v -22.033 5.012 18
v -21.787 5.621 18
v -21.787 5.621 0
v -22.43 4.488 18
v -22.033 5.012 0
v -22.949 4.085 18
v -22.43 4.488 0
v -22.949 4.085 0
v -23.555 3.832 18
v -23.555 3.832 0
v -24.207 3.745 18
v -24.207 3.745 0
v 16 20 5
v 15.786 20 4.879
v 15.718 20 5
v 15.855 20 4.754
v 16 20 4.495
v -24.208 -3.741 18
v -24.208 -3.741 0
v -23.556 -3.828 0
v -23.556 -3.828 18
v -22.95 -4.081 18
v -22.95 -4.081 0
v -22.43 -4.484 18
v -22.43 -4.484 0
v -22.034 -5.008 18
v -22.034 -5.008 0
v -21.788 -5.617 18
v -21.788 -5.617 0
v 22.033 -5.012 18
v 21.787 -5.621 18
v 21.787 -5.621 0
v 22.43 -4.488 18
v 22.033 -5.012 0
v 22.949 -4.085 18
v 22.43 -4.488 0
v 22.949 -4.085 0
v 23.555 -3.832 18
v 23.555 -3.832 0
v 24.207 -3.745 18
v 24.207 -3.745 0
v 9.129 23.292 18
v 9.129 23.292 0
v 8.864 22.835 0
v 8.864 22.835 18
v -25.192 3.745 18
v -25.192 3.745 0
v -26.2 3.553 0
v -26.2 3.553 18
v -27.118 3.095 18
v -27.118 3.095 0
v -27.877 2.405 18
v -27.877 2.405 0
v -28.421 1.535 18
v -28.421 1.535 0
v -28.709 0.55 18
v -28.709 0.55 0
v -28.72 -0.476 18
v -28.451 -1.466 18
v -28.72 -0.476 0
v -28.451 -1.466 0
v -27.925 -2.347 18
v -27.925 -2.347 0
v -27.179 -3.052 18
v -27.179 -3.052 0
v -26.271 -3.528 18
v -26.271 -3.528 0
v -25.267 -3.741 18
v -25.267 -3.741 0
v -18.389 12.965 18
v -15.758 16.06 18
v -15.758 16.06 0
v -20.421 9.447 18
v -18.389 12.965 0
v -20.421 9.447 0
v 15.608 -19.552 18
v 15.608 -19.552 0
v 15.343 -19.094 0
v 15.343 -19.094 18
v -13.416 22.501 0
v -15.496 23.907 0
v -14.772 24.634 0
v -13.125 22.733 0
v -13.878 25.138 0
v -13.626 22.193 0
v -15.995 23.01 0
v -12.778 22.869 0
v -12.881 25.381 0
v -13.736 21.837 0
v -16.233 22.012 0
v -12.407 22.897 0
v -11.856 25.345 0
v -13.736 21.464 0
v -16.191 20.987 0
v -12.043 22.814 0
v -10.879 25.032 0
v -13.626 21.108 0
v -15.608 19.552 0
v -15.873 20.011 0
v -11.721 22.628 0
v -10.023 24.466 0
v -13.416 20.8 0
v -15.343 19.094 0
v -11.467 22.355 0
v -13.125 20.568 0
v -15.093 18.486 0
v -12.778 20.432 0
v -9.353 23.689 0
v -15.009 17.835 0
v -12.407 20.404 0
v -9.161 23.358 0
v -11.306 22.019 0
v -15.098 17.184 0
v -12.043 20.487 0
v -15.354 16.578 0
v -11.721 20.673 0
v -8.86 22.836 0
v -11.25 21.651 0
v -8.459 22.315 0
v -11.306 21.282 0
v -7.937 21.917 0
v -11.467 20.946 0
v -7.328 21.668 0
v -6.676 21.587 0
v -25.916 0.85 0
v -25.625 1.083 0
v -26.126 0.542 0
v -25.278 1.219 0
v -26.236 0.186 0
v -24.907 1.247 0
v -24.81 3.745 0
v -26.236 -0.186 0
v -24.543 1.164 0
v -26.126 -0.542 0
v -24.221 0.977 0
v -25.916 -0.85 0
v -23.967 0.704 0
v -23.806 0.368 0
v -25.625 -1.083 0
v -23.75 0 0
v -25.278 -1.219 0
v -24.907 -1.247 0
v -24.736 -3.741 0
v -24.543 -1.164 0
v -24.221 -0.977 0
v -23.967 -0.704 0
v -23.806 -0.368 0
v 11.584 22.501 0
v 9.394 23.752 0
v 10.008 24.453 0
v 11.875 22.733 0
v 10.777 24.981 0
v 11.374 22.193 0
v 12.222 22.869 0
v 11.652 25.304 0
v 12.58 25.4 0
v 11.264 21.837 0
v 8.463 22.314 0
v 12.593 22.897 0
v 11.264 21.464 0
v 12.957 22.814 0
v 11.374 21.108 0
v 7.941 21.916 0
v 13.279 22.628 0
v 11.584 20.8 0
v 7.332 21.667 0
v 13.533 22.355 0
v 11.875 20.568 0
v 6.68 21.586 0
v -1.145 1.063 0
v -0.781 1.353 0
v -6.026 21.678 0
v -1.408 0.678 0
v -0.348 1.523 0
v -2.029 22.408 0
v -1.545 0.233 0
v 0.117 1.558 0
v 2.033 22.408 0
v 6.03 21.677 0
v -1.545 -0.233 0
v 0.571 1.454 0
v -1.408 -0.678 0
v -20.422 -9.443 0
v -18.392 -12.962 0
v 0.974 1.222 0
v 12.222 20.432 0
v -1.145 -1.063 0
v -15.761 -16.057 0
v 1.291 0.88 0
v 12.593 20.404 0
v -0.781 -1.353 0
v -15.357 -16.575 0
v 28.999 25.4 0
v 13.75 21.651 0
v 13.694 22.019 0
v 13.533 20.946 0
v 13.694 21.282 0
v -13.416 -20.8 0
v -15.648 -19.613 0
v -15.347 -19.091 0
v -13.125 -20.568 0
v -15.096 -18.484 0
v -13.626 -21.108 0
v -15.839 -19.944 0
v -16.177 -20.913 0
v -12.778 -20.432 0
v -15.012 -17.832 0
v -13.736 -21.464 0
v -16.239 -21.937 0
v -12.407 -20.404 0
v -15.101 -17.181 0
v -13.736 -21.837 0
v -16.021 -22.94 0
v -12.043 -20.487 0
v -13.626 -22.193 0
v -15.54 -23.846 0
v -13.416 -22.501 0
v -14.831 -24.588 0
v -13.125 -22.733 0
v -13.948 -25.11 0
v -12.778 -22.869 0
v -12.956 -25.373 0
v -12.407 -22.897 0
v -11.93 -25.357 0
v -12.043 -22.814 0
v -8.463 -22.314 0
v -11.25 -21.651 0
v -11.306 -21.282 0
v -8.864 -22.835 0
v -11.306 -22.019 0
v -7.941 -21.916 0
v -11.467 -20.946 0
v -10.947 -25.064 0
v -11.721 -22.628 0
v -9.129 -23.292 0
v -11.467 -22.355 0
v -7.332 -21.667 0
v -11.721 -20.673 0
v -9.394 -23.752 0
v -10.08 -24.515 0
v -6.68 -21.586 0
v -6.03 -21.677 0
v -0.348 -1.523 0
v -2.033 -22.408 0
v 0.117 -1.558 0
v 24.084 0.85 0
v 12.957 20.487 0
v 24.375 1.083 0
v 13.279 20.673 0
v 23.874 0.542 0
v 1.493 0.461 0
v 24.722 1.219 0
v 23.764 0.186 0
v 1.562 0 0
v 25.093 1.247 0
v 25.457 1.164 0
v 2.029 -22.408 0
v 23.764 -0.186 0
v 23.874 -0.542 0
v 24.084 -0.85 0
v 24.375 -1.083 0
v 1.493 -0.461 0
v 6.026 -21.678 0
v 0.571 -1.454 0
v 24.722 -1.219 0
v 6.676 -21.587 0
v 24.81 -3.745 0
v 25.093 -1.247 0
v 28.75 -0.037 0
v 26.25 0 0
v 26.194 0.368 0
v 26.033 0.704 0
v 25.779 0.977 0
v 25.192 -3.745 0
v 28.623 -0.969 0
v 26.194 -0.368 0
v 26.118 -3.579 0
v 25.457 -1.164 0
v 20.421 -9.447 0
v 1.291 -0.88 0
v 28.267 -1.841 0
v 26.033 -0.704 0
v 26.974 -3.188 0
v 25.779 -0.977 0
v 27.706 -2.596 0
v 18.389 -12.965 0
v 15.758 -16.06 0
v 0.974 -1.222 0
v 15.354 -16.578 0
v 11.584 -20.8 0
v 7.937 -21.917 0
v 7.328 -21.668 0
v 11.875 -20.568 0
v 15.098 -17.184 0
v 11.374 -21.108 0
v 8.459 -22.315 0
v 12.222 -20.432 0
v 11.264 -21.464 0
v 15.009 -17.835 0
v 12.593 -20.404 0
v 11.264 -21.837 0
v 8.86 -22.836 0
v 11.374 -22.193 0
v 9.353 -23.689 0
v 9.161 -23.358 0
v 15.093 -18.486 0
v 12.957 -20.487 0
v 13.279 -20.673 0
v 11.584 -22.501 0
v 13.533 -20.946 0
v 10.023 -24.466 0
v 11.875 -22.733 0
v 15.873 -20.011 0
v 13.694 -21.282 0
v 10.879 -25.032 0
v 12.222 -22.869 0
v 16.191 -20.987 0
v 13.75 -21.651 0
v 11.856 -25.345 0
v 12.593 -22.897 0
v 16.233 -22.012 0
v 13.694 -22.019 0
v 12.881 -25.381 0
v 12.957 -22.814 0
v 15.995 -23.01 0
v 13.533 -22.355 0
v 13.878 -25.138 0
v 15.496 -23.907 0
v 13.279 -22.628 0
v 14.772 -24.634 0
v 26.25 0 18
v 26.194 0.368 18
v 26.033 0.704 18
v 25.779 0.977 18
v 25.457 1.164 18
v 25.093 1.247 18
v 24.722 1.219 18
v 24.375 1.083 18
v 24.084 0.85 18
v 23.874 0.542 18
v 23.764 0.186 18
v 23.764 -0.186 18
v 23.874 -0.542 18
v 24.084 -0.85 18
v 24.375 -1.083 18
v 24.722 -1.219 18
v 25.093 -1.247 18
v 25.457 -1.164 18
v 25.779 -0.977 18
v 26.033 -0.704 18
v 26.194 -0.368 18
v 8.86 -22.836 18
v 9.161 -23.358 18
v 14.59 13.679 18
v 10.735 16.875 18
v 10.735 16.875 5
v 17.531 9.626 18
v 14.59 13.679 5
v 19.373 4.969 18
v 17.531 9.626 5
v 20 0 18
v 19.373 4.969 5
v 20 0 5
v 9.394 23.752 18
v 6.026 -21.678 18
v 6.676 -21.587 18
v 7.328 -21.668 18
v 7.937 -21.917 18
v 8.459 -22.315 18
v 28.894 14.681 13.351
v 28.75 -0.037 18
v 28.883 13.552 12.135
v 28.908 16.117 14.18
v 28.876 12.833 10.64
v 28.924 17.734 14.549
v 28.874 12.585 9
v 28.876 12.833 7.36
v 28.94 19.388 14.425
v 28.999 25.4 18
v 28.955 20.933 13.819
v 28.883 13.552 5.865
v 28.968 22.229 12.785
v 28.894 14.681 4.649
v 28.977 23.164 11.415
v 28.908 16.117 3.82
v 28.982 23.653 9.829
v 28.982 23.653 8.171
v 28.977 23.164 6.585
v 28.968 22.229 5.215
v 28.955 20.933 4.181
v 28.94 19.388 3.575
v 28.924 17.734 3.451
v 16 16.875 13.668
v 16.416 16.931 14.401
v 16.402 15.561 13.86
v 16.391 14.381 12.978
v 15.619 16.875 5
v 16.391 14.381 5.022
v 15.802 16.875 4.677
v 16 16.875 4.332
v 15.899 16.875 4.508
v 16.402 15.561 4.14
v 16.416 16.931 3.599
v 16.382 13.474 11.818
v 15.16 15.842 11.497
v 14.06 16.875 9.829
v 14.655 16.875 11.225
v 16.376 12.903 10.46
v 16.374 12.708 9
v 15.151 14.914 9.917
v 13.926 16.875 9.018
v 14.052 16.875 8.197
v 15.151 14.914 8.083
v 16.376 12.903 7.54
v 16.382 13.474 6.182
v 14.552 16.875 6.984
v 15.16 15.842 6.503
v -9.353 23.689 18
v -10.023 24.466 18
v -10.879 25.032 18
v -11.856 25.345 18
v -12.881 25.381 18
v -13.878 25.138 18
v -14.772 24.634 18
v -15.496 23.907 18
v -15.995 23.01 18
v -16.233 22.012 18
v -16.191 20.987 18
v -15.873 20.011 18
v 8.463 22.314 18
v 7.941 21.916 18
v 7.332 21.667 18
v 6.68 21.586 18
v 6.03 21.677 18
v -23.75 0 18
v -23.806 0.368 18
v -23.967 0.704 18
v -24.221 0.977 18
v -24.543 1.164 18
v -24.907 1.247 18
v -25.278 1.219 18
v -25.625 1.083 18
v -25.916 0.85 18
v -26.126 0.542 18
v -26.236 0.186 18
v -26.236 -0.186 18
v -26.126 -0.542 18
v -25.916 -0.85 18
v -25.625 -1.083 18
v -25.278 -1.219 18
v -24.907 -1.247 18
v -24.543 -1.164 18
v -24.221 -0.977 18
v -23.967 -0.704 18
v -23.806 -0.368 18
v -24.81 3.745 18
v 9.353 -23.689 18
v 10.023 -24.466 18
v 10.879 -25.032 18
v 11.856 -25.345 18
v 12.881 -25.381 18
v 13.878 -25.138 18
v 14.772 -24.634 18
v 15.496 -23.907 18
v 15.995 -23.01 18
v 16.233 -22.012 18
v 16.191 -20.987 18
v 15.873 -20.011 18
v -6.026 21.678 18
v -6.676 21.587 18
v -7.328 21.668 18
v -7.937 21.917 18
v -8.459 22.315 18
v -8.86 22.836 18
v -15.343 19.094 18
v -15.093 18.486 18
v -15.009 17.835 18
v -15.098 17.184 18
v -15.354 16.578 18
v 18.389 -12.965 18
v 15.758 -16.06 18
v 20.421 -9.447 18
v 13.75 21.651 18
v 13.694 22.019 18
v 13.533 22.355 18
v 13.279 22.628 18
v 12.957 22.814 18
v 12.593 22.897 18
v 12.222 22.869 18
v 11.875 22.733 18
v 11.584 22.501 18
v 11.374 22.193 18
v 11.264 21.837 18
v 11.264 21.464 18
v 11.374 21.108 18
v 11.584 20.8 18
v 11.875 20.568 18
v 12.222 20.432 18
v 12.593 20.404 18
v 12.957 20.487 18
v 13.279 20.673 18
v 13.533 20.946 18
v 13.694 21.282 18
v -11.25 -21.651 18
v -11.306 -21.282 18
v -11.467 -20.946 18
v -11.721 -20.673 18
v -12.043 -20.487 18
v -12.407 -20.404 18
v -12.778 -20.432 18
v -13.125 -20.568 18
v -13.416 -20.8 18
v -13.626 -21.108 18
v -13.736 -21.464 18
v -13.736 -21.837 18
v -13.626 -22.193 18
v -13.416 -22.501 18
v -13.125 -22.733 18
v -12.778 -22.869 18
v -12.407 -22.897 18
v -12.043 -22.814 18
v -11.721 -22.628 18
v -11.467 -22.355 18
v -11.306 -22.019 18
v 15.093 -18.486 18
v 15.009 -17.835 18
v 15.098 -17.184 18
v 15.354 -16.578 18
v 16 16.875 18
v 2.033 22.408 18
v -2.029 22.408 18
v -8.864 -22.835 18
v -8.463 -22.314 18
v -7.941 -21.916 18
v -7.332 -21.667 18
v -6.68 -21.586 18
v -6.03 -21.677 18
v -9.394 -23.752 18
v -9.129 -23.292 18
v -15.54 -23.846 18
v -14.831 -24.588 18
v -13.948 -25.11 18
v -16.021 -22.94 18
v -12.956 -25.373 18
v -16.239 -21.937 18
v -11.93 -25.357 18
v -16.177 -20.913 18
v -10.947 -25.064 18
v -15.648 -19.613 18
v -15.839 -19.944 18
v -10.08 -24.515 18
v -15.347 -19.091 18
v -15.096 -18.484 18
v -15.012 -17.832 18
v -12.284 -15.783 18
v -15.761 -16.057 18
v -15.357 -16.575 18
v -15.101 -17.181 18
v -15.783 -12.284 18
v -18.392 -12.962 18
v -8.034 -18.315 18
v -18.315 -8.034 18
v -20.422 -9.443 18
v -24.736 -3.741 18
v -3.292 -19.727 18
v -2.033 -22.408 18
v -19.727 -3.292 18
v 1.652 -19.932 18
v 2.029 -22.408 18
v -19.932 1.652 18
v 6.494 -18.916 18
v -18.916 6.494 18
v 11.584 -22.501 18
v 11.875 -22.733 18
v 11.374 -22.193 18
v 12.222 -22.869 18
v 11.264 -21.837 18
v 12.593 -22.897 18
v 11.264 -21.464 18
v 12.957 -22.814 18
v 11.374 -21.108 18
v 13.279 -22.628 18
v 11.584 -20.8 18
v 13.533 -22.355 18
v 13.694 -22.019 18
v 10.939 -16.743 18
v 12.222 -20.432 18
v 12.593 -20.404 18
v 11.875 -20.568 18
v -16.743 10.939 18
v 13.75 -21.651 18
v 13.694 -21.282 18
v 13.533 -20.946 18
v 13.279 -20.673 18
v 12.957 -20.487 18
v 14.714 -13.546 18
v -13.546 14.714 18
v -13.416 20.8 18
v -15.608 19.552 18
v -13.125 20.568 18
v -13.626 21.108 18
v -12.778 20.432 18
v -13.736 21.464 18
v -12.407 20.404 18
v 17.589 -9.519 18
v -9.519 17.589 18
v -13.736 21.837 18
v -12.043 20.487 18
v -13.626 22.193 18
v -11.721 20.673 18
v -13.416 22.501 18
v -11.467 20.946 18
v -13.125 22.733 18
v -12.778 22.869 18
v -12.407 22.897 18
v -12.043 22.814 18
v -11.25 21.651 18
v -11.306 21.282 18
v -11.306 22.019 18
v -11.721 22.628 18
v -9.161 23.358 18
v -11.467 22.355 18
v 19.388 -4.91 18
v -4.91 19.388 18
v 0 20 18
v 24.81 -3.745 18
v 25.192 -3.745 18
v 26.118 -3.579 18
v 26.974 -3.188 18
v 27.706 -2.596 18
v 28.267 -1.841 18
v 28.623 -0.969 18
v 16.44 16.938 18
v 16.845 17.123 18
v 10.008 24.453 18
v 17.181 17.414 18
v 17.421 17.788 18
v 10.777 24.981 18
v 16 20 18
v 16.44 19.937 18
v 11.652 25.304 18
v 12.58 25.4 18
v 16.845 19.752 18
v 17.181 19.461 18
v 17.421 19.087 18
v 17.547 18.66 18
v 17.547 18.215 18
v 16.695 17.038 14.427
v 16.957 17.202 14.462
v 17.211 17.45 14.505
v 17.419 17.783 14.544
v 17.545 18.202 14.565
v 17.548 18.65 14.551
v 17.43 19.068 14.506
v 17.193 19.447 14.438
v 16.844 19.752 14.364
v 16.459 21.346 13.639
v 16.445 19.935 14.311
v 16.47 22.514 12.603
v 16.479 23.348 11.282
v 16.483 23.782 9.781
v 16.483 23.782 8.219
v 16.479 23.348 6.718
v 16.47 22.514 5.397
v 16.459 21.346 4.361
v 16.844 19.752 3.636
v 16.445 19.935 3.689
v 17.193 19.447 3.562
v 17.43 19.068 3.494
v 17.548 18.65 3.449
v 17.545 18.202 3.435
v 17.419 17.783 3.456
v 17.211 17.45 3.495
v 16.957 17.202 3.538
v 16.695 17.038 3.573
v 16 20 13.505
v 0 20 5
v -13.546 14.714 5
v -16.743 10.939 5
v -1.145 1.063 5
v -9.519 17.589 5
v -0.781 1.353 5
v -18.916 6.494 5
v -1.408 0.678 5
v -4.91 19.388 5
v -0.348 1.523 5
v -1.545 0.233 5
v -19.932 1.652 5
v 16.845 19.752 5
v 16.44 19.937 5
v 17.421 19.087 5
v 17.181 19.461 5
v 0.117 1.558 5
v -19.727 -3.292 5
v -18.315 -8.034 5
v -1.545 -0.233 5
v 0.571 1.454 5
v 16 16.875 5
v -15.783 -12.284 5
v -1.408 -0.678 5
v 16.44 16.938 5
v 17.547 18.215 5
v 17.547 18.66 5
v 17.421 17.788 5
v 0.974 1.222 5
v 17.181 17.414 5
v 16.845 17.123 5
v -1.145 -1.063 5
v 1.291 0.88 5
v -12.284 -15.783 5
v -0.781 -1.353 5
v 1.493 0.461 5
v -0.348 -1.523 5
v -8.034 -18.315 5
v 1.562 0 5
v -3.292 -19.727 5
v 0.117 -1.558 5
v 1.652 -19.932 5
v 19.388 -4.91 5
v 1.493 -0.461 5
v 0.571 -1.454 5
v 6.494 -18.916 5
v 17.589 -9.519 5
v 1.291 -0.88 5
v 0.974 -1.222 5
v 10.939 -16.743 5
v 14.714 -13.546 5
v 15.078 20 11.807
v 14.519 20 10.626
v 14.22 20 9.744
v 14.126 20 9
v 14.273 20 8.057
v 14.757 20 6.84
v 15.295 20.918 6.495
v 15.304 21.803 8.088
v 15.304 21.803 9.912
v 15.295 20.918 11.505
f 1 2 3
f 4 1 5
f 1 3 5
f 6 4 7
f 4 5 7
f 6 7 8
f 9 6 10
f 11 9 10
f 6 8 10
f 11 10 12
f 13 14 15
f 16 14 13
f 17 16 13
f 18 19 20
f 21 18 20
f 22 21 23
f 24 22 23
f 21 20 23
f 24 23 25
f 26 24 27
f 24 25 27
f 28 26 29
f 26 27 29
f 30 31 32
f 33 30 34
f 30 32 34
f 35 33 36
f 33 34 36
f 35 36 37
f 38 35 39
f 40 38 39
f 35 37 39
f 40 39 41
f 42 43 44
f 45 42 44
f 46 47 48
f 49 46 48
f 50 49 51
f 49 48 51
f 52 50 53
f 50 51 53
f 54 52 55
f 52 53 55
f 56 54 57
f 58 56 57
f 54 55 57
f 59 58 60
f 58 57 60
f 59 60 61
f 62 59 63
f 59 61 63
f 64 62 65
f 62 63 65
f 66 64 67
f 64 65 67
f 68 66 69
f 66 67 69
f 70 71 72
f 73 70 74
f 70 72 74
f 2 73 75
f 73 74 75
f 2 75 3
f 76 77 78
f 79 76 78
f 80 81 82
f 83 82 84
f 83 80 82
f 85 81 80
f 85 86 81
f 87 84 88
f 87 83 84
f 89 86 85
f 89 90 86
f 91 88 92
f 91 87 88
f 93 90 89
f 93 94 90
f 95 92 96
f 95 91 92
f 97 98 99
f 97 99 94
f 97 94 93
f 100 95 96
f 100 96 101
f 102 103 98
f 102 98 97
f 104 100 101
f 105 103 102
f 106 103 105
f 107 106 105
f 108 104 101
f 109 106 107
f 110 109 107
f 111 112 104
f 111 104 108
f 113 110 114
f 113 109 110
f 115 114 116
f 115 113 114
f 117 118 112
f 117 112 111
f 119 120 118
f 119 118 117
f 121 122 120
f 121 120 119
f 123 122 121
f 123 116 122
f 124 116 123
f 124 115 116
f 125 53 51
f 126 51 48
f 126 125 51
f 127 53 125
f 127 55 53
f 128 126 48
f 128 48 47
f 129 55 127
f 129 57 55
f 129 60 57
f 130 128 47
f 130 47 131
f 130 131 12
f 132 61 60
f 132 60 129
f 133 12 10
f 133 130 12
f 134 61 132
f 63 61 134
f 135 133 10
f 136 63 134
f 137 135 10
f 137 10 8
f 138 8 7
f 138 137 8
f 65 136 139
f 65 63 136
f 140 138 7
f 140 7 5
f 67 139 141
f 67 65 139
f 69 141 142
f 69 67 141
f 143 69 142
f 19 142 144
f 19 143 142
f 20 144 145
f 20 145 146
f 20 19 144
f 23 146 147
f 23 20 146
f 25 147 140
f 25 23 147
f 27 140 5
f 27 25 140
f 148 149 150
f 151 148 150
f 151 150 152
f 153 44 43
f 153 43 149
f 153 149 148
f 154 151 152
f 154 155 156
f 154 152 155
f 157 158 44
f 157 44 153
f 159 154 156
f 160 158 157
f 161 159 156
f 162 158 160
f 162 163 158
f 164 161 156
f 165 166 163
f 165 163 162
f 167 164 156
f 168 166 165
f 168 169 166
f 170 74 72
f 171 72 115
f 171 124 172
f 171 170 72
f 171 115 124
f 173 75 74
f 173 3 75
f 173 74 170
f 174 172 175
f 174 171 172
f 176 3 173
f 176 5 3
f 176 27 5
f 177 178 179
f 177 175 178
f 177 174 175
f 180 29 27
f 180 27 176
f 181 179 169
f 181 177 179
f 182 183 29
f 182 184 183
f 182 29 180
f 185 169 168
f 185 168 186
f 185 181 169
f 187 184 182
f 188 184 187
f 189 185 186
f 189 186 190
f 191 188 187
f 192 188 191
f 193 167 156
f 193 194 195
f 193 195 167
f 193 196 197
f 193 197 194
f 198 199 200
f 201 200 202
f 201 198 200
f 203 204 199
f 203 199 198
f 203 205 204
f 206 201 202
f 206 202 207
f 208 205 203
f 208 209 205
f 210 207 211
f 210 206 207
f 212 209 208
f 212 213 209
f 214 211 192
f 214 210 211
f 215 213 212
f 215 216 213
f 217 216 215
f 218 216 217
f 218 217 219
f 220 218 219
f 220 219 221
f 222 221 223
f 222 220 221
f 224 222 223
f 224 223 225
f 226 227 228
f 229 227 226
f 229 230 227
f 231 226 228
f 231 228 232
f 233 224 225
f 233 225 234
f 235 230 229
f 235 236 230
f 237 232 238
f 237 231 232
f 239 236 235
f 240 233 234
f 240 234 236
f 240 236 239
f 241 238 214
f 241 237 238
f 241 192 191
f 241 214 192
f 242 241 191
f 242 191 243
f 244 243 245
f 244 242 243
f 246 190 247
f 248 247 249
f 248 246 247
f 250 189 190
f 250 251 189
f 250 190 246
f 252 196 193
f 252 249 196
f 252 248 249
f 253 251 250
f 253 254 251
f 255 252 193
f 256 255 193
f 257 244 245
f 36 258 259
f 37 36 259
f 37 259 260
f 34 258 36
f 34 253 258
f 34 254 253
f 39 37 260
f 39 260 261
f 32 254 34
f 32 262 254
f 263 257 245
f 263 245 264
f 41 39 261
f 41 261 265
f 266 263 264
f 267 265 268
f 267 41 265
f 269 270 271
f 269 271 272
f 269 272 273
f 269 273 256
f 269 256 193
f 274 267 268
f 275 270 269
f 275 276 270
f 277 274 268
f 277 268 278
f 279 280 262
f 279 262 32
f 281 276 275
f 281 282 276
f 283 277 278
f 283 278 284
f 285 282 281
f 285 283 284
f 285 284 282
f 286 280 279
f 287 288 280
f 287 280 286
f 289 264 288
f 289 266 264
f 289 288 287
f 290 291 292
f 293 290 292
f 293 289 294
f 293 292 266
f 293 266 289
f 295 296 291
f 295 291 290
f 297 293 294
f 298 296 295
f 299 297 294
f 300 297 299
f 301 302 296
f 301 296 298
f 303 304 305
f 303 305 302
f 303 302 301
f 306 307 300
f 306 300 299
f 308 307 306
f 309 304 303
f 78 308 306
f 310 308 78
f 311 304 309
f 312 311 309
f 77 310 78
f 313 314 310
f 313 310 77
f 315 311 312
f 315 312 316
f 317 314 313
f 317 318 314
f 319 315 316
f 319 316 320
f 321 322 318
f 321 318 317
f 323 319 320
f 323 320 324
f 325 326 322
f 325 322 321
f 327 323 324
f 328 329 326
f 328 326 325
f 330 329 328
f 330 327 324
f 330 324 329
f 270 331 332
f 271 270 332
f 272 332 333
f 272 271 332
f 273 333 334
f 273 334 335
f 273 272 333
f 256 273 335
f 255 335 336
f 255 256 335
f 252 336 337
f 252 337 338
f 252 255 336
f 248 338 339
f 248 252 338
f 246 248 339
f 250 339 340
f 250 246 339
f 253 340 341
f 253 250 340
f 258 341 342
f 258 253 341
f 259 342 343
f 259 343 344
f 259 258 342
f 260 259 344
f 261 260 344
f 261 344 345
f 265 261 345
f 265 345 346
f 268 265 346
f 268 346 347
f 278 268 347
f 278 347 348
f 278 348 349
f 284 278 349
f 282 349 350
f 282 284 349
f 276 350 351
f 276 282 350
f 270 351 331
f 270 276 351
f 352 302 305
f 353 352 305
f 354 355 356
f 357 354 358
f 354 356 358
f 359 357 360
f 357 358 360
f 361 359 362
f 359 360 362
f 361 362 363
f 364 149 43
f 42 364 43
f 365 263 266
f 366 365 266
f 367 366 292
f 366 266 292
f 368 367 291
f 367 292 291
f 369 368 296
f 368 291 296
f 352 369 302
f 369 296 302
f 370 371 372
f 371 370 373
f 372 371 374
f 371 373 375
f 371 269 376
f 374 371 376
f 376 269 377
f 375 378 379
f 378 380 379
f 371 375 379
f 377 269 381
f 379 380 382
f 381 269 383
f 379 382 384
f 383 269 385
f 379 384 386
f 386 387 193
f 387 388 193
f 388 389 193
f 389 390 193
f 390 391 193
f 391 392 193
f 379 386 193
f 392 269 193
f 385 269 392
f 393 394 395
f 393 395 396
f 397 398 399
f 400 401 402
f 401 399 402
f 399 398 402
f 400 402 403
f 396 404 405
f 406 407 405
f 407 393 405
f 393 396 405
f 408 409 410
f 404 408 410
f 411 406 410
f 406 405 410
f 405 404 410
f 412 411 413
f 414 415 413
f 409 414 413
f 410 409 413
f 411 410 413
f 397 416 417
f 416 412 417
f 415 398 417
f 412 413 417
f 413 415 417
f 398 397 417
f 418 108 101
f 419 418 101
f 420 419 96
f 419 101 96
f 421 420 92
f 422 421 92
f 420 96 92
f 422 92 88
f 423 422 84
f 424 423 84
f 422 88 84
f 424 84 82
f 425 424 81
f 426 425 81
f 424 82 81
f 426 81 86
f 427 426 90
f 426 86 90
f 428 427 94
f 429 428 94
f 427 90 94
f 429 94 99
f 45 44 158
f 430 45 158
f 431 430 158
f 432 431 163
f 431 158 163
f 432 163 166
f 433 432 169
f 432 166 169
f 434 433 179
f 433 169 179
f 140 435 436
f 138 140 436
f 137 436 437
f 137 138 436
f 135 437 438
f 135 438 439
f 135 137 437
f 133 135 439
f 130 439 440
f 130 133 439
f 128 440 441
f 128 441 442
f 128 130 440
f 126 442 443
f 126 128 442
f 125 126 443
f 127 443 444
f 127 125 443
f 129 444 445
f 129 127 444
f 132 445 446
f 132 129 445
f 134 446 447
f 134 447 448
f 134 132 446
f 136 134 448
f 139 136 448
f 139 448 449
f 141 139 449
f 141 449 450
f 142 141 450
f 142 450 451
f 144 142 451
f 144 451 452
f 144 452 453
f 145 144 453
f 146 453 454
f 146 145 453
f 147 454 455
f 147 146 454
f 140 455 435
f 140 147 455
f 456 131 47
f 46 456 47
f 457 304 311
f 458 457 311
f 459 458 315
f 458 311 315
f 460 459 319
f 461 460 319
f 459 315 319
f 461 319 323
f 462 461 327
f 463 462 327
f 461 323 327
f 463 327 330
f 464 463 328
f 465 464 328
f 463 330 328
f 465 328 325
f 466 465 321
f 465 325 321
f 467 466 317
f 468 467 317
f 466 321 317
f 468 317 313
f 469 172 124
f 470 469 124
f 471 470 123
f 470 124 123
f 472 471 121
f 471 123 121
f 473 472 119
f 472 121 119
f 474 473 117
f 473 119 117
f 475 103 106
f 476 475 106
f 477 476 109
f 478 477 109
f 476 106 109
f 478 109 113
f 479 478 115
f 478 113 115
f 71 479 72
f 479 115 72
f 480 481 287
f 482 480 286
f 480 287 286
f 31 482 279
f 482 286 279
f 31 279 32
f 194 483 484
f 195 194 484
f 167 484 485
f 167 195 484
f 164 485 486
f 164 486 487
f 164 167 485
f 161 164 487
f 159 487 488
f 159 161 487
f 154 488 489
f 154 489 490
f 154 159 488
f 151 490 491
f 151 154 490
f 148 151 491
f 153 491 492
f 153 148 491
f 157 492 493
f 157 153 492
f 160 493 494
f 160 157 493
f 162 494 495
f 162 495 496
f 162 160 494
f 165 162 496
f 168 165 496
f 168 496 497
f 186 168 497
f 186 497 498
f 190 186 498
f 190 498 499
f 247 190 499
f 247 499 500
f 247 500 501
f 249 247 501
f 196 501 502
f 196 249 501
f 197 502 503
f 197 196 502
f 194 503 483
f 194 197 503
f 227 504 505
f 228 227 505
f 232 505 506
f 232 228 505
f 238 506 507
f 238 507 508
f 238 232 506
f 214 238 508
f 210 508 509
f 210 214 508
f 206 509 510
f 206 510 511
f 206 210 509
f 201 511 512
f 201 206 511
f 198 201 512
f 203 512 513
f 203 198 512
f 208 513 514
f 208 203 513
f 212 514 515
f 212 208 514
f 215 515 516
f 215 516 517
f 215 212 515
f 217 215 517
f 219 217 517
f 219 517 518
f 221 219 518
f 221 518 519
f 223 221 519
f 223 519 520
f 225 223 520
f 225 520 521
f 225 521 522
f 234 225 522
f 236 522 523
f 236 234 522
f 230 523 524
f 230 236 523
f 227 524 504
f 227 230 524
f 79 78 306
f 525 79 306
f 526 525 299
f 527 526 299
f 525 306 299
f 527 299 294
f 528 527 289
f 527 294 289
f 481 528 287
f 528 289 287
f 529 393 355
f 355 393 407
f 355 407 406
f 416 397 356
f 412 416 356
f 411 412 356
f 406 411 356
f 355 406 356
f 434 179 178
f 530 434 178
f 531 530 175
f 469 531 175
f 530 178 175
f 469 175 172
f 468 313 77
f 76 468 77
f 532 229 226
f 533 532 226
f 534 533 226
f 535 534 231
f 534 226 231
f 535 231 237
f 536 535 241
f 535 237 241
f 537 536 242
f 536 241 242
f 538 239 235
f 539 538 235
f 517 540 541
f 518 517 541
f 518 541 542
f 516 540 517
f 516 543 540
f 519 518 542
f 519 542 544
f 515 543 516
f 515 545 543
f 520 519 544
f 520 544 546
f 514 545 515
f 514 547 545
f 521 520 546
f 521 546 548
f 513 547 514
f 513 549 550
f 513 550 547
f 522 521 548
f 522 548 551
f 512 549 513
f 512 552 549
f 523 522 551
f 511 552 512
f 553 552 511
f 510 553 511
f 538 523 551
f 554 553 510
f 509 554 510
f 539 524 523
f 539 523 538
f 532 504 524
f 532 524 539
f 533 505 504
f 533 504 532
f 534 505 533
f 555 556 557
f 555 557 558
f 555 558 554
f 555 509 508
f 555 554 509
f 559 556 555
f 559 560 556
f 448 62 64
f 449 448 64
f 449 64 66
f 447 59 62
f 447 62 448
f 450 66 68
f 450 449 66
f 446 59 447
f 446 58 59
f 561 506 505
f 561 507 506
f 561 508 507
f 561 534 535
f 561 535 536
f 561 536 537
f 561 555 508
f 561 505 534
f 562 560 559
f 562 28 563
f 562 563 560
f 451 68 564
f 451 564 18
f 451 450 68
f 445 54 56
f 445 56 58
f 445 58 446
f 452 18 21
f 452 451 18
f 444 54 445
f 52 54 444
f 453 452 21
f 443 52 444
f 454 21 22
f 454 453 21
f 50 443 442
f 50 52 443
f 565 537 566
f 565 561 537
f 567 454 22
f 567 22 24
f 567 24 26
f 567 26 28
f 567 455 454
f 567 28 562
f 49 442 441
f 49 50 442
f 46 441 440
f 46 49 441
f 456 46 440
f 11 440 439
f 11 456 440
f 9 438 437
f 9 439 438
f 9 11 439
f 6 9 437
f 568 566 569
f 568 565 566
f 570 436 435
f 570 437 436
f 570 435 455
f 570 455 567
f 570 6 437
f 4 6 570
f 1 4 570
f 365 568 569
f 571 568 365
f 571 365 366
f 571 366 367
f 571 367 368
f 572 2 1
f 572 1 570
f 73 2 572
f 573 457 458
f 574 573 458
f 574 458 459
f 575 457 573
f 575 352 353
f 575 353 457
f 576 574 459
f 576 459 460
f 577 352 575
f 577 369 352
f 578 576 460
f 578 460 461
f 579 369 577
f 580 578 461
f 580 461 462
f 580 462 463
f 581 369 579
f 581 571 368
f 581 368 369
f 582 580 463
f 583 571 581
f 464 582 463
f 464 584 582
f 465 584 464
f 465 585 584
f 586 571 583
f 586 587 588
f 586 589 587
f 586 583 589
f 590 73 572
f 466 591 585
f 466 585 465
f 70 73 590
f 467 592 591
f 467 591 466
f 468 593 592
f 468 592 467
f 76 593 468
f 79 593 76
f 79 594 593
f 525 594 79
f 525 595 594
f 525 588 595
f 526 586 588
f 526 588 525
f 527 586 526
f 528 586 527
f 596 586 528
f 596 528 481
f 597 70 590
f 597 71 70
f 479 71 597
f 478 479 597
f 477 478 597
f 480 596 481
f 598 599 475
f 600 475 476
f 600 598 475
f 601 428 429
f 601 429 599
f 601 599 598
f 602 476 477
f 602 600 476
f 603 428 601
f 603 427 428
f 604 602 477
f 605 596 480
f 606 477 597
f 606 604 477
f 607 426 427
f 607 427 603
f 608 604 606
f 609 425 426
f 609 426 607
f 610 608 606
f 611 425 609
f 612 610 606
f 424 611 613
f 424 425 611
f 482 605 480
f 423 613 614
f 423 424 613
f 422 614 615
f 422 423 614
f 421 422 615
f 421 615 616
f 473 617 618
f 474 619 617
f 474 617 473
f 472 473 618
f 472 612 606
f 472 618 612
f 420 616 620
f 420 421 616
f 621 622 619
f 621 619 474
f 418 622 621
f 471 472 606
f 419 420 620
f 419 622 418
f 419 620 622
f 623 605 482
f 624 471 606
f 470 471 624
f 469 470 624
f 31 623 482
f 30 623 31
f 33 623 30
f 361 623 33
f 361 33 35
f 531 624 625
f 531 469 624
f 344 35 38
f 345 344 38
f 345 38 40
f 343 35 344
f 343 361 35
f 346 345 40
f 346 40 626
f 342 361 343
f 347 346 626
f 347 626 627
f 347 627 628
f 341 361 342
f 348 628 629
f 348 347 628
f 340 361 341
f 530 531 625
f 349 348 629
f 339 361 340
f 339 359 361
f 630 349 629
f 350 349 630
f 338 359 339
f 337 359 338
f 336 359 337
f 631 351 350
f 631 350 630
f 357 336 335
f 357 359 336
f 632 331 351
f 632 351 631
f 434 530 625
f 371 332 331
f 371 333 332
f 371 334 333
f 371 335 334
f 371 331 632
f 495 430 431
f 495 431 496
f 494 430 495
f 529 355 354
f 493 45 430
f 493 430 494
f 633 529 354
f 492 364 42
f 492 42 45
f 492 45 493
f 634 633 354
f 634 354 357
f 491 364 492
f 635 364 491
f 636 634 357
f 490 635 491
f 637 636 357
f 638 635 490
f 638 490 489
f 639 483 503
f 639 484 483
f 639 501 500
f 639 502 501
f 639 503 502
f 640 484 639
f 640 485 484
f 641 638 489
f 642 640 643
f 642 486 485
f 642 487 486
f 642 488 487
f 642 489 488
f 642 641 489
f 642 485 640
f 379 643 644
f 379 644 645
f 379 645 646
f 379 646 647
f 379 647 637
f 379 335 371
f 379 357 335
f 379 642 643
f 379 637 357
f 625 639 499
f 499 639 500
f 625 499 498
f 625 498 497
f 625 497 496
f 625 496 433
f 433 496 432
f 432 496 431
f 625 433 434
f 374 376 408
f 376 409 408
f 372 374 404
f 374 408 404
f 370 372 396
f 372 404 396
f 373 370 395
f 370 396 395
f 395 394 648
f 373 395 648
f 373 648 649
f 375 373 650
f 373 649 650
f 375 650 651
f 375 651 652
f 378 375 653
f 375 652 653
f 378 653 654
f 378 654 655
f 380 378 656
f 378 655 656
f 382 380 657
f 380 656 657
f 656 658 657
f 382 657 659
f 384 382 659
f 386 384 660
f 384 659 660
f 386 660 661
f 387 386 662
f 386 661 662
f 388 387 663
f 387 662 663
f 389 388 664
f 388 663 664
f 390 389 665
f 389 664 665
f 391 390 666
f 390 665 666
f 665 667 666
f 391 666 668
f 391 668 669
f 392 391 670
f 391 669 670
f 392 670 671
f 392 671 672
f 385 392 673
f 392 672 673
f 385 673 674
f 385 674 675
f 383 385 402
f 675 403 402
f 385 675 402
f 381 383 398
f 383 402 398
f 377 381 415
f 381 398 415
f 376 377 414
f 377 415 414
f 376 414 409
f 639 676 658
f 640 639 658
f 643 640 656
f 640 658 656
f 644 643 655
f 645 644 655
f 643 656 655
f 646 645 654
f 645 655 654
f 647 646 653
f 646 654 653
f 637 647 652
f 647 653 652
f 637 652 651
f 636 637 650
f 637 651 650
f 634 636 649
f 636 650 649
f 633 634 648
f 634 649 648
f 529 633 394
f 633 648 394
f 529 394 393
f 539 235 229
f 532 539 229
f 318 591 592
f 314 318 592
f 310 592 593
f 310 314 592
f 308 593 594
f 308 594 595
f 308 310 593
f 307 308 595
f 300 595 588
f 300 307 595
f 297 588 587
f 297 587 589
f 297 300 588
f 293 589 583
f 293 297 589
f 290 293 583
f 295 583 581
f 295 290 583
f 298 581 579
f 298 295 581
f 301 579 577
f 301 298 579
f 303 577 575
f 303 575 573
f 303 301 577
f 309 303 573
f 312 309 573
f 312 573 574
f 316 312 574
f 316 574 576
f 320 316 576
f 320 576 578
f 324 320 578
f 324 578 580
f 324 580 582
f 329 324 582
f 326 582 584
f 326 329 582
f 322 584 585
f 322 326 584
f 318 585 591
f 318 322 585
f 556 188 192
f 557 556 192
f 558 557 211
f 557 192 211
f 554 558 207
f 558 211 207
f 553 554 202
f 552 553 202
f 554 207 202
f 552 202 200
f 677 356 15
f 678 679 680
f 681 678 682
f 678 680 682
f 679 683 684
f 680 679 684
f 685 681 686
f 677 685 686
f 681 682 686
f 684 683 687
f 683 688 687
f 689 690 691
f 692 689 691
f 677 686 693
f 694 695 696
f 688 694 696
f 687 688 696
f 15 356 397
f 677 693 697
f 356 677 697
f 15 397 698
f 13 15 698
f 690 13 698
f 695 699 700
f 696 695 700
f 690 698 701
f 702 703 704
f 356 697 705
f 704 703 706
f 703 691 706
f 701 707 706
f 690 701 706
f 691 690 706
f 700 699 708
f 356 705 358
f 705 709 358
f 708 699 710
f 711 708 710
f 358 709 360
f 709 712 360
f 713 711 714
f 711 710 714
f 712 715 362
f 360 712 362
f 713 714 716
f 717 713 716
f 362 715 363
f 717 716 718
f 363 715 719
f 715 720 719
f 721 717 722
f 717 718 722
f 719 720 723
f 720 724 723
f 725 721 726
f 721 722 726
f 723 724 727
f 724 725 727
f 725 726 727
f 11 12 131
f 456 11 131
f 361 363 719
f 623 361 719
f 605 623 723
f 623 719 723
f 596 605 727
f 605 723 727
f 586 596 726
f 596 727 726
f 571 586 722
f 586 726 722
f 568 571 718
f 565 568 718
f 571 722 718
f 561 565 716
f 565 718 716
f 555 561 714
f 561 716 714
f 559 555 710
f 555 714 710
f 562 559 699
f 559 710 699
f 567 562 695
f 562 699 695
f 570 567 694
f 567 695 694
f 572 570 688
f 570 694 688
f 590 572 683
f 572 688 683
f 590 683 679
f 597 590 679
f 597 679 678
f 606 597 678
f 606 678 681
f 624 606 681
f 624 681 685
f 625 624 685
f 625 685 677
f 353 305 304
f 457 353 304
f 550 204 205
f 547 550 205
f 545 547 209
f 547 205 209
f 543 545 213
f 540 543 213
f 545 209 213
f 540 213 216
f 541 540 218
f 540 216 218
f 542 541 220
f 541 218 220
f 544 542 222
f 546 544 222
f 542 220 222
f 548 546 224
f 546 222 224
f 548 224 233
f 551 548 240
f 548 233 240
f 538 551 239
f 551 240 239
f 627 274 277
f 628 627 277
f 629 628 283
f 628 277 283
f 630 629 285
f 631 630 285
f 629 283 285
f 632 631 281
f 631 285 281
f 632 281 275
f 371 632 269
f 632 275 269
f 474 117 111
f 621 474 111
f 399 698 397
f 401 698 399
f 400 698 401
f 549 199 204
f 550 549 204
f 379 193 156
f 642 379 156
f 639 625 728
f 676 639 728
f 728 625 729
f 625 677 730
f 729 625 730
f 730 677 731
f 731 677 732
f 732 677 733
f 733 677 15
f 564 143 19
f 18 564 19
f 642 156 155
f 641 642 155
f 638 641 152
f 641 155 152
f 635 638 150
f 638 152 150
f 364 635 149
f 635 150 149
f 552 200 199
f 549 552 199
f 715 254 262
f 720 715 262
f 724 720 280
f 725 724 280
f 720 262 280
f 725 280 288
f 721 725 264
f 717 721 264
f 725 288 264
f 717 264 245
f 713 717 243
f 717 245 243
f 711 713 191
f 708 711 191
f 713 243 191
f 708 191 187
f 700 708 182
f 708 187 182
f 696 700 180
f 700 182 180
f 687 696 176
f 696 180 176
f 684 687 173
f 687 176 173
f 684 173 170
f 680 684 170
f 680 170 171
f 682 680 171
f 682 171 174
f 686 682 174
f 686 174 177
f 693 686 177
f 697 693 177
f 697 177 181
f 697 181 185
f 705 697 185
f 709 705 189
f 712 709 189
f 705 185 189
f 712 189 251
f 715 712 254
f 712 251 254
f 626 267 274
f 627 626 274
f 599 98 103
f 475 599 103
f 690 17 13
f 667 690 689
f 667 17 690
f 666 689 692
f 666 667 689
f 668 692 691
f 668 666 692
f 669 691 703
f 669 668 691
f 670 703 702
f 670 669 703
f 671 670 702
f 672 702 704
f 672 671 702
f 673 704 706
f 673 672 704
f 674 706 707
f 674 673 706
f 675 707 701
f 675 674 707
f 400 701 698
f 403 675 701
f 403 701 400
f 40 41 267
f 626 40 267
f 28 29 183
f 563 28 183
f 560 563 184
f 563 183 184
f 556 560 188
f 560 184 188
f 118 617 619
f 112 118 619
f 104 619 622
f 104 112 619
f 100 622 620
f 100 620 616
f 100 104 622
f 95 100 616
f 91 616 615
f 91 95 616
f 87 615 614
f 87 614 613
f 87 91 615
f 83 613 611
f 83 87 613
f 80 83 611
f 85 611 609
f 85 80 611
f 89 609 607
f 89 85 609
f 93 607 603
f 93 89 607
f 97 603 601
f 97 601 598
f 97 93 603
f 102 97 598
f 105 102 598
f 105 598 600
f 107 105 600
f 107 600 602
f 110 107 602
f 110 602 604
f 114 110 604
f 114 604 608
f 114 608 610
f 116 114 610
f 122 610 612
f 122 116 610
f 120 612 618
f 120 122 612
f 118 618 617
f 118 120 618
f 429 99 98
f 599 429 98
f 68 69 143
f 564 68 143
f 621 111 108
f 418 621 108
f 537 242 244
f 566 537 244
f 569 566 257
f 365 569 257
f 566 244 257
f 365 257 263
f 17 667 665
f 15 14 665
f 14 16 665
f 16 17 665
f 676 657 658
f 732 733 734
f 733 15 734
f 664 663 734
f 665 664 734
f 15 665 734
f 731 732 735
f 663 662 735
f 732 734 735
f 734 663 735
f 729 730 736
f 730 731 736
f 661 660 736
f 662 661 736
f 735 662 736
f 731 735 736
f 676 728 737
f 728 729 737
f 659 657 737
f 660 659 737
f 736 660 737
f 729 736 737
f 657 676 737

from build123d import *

# Parameters (mm, degrees)
F0_R     = 1.25
F1_DEPTH = 18
F3_D     = 11.13
F3_DEPTH = 12.5
F3_TIP   = 3.3437893449
F4_R     = 1.5625
F5_DEPTH = 5


with BuildPart() as f1:
    # F0 (on Top) → F1 (new body)
    with BuildSketch(Plane.XY):
        with BuildLine():
            ThreePointArc((-15.3434944638, 19.0939042011), (-15.0320560296, 17.5061736151), (-15.7581247751, 16.060246062))
            ThreePointArc((-15.7581247751, 16.060246062), (-19.4845549428, 11.2517606925), (-21.7866280292, 5.620750761))
            ThreePointArc((-21.7866280292, 5.620750761), (-22.6760479277, 4.2691537219), (-24.2068768675, 3.7452786709))
            Line((-24.2068768675, 3.7452786709), (-24.8095572627, 3.7451611218))
            Line((-24.8095572627, 3.7451611218), (-25.1919036634, 3.7450865475))
            ThreePointArc((-25.1919036634, 3.7450865475), (-28.7498129399, 0.0374555534), (-25.2666745248, -3.7405059061))
            Line((-25.2666745248, -3.7405059061), (-24.7361366604, -3.7407052642))
            Line((-24.7361366604, -3.7407052642), (-24.2075533275, -3.7409038879))
            ThreePointArc((-24.2075533275, -3.7409038879), (-22.6768190885, -4.2650555852), (-21.7876434683, -5.6168133403))
            ThreePointArc((-21.7876434683, -5.6168133403), (-19.4865880684, -11.2482392157), (-15.761026962, -16.0573979556))
            ThreePointArc((-15.761026962, -16.0573979556), (-15.0352195396, -17.5034567019), (-15.346944907, -19.0911309781))
            Line((-15.346944907, -19.0911309781), (-15.6481833041, -19.6131262852))
            Line((-15.6481833041, -19.6131262852), (-15.8392919213, -19.9442852685))
            ThreePointArc((-15.8392919213, -19.9442852685), (-14.4073439307, -24.8793405833), (-9.3939641247, -23.7518349607))
            Line((-9.3939641247, -23.7518349607), (-9.1285225433, -23.2924753715))
            Line((-9.1285225433, -23.2924753715), (-8.8640588637, -22.834808089))
            ThreePointArc((-8.8640588637, -22.834808089), (-7.6447630589, -21.7712292003), (-6.0295186932, -21.6770594023))
            ThreePointArc((-6.0295186932, -21.6770594023), (-0.0020331256, -22.4999999081), (6.0256010672, -21.6781487166))
            ThreePointArc((6.0256010672, -21.6781487166), (7.640828388, -21.7726104237), (8.8599319605, -22.836409649))
            Line((8.8599319605, -22.836409649), (9.1613739586, -23.358287407))
            Line((9.1613739586, -23.358287407), (9.3526117422, -23.689371816))
            ThreePointArc((9.3526117422, -23.689371816), (14.3424690092, -24.9167961367), (15.8727104001, -20.0113290546))
            Line((15.8727104001, -20.0113290546), (15.6076141171, -19.5517701073))
            Line((15.6076141171, -19.5517701073), (15.3434944638, -19.0939042011))
            ThreePointArc((15.3434944638, -19.0939042011), (15.0320560296, -17.5061736151), (15.7581247751, -16.060246062))
            ThreePointArc((15.7581247751, -16.060246062), (19.4845549428, -11.2517606925), (21.7866280292, -5.620750761))
            ThreePointArc((21.7866280292, -5.620750761), (22.6760479277, -4.2691537219), (24.2068768675, -3.7452786709))
            Line((24.2068768675, -3.7452786709), (24.8095572627, -3.7451611218))
            Line((24.8095572627, -3.7451611218), (25.1919036634, -3.7450865475))
            ThreePointArc((25.1919036634, -3.7450865475), (27.7059534295, -2.5962118983), (28.7498196477, -0.0367778781))
            Line((28.7498196477, -0.0367778781), (28.9992988817, 25.3997910768))
            Line((28.9992988817, 25.3997910768), (12.5795568592, 25.3997910768))
            ThreePointArc((12.5795568592, 25.3997910768), (10.7769696358, 24.9813506545), (9.3939641247, 23.7518349607))
            Line((9.3939641247, 23.7518349607), (9.1285225433, 23.2924753715))
            Line((9.1285225433, 23.2924753715), (8.8640588637, 22.834808089))
            ThreePointArc((8.8640588637, 22.834808089), (7.6447630589, 21.7712292003), (6.0295186932, 21.6770594023))
            ThreePointArc((6.0295186932, 21.6770594023), (0.0020331256, 22.4999999081), (-6.0256010672, 21.6781487166))
            ThreePointArc((-6.0256010672, 21.6781487166), (-7.640828388, 21.7726104237), (-8.8599319605, 22.836409649))
            Line((-8.8599319605, 22.836409649), (-9.1613739586, 23.358287407))
            Line((-9.1613739586, 23.358287407), (-9.3526117422, 23.689371816))
            ThreePointArc((-9.3526117422, 23.689371816), (-14.3424690092, 24.9167961367), (-15.8727104001, 20.0113290546))
            Line((-15.8727104001, 20.0113290546), (-15.6076141171, 19.5517701073))
            Line((-15.6076141171, 19.5517701073), (-15.3434944638, 19.0939042011))
        make_face()
        with Locations((-12.5, -21.650635024)):
            Circle(F0_R, mode=Mode.SUBTRACT)
        with Locations((12.4999999694, -21.6506350416)):
            Circle(F0_R, mode=Mode.SUBTRACT)
        with Locations((-24.9999999694, 5.3e-08)):
            Circle(F0_R, mode=Mode.SUBTRACT)
        with BuildLine():
            ThreePointArc((10.7347275233, 16.875), (17.5313226892, 9.6256285388), (20, 0))
            ThreePointArc((20, 0), (-14.1421356237, -14.1421356237), (0, 20))
            Line((0, 20), (13.682886083, 20))
            Line((13.682886083, 20), (16, 20))
            ThreePointArc((16, 20), (17.5625, 18.4375), (16, 16.875))
            Line((16, 16.875), (13.7064243678, 16.875))
            Line((13.7064243678, 16.875), (10.7347275233, 16.875))
        make_face(mode=Mode.SUBTRACT)
        with Locations((-12.4999999694, 21.6506351123)):
            Circle(F0_R, mode=Mode.SUBTRACT)
        with Locations((24.9999999694, 1.77e-08)):
            Circle(F0_R, mode=Mode.SUBTRACT)
        with Locations((12.5, 21.6506350946)):
            Circle(F0_R, mode=Mode.SUBTRACT)
    extrude(amount=F1_DEPTH)

    # F3
    with Locations(Plane(origin=(28.7474150086, -0.2819516693, 0), x_dir=(0.0098074247, 0.9999519061, 0), z_dir=(0.9999519061, -0.0098074247, 0))):
        with Locations((18.4329779418, 9)):
            Hole(F3_D / 2, depth=F3_DEPTH)
            with Locations((0, 0, -(F3_DEPTH + F3_TIP / 2))):  # 118° drill point
                Cone(0, F3_D / 2, F3_TIP, mode=Mode.SUBTRACT)

    # F4 (on face) → F5 (join)
    with BuildSketch(Plane(origin=(0, 0, 0), x_dir=(1, 0, 0), z_dir=(0, 0, -1))):
        with BuildLine():
            ThreePointArc((10.7347275233, -16.875), (-5.5901699437, 19.2028643697), (0, -20))
            Line((0, -20), (16, -20))
            ThreePointArc((16, -20), (17.5625, -18.4375), (16, -16.875))
            Line((16, -16.875), (10.7347275233, -16.875))
        make_face()
        Circle(F4_R, mode=Mode.SUBTRACT)
    extrude(amount=-F5_DEPTH)


solid = f1.part
